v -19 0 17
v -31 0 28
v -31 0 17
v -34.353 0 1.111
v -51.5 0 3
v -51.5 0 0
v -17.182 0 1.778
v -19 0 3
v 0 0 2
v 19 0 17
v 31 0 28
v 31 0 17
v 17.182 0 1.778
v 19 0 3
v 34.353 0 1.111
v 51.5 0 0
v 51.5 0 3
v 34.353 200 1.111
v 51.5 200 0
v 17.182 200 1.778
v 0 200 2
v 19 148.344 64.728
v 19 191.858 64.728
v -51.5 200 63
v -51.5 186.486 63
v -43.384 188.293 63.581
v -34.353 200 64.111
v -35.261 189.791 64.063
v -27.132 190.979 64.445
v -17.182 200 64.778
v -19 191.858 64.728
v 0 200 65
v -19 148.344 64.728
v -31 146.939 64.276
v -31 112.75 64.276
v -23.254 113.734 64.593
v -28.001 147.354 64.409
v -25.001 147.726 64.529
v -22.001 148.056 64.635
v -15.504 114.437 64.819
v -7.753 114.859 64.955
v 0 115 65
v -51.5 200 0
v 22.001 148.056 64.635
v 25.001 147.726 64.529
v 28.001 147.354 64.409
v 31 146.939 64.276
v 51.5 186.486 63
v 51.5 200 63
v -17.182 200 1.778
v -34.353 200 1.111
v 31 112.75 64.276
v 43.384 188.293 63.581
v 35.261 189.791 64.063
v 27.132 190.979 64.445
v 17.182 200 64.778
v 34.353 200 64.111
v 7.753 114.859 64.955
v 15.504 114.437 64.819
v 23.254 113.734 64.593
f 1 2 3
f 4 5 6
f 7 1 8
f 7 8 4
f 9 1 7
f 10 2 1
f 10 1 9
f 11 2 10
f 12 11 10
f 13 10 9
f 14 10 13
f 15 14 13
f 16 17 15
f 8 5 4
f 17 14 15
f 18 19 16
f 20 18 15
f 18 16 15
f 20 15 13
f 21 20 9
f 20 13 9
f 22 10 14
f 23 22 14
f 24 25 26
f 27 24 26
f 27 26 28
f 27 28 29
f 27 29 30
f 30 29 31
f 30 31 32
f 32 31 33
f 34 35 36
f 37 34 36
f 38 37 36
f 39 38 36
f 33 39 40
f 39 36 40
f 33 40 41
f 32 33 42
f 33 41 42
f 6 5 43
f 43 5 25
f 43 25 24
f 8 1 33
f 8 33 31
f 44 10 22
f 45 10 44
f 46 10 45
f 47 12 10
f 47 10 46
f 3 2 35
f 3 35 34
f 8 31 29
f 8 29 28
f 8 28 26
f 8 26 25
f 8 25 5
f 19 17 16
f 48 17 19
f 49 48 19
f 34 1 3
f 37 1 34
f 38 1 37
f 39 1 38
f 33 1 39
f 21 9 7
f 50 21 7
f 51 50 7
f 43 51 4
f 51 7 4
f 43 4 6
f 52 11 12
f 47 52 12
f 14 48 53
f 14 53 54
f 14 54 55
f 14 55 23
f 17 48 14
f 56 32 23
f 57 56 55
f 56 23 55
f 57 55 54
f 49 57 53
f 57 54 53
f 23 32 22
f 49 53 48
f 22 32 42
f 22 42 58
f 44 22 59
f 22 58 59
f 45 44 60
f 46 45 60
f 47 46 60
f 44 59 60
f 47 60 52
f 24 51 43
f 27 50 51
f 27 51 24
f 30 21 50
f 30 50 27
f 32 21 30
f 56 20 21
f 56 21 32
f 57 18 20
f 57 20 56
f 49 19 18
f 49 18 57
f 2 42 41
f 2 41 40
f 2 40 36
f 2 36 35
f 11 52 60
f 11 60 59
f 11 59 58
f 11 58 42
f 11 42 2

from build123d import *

# Parameters (mm, degrees)
F1_DEPTH = 51.5
F2_DEPTH = 19
F3_DEPTH = 31
F5_DEPTH = 200
F7_DEPTH = 200


with BuildPart() as f1:
    # F0 (on Right) → F1 (new body, symmetric)
    with BuildSketch(Plane.YZ):
        Polygon((0, 3), (0, 0), (200, 0), (200, 65), (192.702703, 65), align=None)
    extrude(amount=F1_DEPTH, both=True)

    # F0 (on Right) → F2 (join, symmetric)
    with BuildSketch(Plane.YZ):
        Polygon((0, 17), (0, 3), (192.702703, 65), (149.189189, 65), align=None)
    extrude(amount=F2_DEPTH, both=True)

    # F0 (on Right) → F3 (join, symmetric)
    with BuildSketch(Plane.YZ):
        Polygon((0, 28), (0, 17), (149.189189, 65), (115, 65), align=None)
    extrude(amount=F3_DEPTH, both=True)

    # F4 (on Front) → F5 (cut)
    with BuildSketch(Plane.XZ):
        with BuildLine():
            Line((-51.5, 0), (0, 0))
            Line((0, 0), (0, 2))
            ThreePointArc((0, 2), (-25.76941, 1.499812), (-51.5, 0))
        make_face()
        with BuildLine():
            Line((0, 2), (0, 0))
            Line((0, 0), (51.5, 0))
            ThreePointArc((51.5, 0), (25.76941, 1.499812), (0, 2))
        make_face()
    extrude(amount=-F5_DEPTH, mode=Mode.SUBTRACT)

    # F6 (on Front) → F7 (cut)
    with BuildSketch(Plane.XZ):
        with BuildLine():
            ThreePointArc((0, 65), (25.76941, 64.499812), (51.5, 63))
            Line((51.5, 63), (51.5, 65))
            Line((51.5, 65), (0, 65))
        make_face()
        with BuildLine():
            Line((-51.5, 65), (-51.5, 63))
            ThreePointArc((-51.5, 63), (-25.76941, 64.499812), (0, 65))
            Line((0, 65), (-51.5, 65))
        make_face()
    extrude(amount=-F7_DEPTH, mode=Mode.SUBTRACT)


solid = f1.part
